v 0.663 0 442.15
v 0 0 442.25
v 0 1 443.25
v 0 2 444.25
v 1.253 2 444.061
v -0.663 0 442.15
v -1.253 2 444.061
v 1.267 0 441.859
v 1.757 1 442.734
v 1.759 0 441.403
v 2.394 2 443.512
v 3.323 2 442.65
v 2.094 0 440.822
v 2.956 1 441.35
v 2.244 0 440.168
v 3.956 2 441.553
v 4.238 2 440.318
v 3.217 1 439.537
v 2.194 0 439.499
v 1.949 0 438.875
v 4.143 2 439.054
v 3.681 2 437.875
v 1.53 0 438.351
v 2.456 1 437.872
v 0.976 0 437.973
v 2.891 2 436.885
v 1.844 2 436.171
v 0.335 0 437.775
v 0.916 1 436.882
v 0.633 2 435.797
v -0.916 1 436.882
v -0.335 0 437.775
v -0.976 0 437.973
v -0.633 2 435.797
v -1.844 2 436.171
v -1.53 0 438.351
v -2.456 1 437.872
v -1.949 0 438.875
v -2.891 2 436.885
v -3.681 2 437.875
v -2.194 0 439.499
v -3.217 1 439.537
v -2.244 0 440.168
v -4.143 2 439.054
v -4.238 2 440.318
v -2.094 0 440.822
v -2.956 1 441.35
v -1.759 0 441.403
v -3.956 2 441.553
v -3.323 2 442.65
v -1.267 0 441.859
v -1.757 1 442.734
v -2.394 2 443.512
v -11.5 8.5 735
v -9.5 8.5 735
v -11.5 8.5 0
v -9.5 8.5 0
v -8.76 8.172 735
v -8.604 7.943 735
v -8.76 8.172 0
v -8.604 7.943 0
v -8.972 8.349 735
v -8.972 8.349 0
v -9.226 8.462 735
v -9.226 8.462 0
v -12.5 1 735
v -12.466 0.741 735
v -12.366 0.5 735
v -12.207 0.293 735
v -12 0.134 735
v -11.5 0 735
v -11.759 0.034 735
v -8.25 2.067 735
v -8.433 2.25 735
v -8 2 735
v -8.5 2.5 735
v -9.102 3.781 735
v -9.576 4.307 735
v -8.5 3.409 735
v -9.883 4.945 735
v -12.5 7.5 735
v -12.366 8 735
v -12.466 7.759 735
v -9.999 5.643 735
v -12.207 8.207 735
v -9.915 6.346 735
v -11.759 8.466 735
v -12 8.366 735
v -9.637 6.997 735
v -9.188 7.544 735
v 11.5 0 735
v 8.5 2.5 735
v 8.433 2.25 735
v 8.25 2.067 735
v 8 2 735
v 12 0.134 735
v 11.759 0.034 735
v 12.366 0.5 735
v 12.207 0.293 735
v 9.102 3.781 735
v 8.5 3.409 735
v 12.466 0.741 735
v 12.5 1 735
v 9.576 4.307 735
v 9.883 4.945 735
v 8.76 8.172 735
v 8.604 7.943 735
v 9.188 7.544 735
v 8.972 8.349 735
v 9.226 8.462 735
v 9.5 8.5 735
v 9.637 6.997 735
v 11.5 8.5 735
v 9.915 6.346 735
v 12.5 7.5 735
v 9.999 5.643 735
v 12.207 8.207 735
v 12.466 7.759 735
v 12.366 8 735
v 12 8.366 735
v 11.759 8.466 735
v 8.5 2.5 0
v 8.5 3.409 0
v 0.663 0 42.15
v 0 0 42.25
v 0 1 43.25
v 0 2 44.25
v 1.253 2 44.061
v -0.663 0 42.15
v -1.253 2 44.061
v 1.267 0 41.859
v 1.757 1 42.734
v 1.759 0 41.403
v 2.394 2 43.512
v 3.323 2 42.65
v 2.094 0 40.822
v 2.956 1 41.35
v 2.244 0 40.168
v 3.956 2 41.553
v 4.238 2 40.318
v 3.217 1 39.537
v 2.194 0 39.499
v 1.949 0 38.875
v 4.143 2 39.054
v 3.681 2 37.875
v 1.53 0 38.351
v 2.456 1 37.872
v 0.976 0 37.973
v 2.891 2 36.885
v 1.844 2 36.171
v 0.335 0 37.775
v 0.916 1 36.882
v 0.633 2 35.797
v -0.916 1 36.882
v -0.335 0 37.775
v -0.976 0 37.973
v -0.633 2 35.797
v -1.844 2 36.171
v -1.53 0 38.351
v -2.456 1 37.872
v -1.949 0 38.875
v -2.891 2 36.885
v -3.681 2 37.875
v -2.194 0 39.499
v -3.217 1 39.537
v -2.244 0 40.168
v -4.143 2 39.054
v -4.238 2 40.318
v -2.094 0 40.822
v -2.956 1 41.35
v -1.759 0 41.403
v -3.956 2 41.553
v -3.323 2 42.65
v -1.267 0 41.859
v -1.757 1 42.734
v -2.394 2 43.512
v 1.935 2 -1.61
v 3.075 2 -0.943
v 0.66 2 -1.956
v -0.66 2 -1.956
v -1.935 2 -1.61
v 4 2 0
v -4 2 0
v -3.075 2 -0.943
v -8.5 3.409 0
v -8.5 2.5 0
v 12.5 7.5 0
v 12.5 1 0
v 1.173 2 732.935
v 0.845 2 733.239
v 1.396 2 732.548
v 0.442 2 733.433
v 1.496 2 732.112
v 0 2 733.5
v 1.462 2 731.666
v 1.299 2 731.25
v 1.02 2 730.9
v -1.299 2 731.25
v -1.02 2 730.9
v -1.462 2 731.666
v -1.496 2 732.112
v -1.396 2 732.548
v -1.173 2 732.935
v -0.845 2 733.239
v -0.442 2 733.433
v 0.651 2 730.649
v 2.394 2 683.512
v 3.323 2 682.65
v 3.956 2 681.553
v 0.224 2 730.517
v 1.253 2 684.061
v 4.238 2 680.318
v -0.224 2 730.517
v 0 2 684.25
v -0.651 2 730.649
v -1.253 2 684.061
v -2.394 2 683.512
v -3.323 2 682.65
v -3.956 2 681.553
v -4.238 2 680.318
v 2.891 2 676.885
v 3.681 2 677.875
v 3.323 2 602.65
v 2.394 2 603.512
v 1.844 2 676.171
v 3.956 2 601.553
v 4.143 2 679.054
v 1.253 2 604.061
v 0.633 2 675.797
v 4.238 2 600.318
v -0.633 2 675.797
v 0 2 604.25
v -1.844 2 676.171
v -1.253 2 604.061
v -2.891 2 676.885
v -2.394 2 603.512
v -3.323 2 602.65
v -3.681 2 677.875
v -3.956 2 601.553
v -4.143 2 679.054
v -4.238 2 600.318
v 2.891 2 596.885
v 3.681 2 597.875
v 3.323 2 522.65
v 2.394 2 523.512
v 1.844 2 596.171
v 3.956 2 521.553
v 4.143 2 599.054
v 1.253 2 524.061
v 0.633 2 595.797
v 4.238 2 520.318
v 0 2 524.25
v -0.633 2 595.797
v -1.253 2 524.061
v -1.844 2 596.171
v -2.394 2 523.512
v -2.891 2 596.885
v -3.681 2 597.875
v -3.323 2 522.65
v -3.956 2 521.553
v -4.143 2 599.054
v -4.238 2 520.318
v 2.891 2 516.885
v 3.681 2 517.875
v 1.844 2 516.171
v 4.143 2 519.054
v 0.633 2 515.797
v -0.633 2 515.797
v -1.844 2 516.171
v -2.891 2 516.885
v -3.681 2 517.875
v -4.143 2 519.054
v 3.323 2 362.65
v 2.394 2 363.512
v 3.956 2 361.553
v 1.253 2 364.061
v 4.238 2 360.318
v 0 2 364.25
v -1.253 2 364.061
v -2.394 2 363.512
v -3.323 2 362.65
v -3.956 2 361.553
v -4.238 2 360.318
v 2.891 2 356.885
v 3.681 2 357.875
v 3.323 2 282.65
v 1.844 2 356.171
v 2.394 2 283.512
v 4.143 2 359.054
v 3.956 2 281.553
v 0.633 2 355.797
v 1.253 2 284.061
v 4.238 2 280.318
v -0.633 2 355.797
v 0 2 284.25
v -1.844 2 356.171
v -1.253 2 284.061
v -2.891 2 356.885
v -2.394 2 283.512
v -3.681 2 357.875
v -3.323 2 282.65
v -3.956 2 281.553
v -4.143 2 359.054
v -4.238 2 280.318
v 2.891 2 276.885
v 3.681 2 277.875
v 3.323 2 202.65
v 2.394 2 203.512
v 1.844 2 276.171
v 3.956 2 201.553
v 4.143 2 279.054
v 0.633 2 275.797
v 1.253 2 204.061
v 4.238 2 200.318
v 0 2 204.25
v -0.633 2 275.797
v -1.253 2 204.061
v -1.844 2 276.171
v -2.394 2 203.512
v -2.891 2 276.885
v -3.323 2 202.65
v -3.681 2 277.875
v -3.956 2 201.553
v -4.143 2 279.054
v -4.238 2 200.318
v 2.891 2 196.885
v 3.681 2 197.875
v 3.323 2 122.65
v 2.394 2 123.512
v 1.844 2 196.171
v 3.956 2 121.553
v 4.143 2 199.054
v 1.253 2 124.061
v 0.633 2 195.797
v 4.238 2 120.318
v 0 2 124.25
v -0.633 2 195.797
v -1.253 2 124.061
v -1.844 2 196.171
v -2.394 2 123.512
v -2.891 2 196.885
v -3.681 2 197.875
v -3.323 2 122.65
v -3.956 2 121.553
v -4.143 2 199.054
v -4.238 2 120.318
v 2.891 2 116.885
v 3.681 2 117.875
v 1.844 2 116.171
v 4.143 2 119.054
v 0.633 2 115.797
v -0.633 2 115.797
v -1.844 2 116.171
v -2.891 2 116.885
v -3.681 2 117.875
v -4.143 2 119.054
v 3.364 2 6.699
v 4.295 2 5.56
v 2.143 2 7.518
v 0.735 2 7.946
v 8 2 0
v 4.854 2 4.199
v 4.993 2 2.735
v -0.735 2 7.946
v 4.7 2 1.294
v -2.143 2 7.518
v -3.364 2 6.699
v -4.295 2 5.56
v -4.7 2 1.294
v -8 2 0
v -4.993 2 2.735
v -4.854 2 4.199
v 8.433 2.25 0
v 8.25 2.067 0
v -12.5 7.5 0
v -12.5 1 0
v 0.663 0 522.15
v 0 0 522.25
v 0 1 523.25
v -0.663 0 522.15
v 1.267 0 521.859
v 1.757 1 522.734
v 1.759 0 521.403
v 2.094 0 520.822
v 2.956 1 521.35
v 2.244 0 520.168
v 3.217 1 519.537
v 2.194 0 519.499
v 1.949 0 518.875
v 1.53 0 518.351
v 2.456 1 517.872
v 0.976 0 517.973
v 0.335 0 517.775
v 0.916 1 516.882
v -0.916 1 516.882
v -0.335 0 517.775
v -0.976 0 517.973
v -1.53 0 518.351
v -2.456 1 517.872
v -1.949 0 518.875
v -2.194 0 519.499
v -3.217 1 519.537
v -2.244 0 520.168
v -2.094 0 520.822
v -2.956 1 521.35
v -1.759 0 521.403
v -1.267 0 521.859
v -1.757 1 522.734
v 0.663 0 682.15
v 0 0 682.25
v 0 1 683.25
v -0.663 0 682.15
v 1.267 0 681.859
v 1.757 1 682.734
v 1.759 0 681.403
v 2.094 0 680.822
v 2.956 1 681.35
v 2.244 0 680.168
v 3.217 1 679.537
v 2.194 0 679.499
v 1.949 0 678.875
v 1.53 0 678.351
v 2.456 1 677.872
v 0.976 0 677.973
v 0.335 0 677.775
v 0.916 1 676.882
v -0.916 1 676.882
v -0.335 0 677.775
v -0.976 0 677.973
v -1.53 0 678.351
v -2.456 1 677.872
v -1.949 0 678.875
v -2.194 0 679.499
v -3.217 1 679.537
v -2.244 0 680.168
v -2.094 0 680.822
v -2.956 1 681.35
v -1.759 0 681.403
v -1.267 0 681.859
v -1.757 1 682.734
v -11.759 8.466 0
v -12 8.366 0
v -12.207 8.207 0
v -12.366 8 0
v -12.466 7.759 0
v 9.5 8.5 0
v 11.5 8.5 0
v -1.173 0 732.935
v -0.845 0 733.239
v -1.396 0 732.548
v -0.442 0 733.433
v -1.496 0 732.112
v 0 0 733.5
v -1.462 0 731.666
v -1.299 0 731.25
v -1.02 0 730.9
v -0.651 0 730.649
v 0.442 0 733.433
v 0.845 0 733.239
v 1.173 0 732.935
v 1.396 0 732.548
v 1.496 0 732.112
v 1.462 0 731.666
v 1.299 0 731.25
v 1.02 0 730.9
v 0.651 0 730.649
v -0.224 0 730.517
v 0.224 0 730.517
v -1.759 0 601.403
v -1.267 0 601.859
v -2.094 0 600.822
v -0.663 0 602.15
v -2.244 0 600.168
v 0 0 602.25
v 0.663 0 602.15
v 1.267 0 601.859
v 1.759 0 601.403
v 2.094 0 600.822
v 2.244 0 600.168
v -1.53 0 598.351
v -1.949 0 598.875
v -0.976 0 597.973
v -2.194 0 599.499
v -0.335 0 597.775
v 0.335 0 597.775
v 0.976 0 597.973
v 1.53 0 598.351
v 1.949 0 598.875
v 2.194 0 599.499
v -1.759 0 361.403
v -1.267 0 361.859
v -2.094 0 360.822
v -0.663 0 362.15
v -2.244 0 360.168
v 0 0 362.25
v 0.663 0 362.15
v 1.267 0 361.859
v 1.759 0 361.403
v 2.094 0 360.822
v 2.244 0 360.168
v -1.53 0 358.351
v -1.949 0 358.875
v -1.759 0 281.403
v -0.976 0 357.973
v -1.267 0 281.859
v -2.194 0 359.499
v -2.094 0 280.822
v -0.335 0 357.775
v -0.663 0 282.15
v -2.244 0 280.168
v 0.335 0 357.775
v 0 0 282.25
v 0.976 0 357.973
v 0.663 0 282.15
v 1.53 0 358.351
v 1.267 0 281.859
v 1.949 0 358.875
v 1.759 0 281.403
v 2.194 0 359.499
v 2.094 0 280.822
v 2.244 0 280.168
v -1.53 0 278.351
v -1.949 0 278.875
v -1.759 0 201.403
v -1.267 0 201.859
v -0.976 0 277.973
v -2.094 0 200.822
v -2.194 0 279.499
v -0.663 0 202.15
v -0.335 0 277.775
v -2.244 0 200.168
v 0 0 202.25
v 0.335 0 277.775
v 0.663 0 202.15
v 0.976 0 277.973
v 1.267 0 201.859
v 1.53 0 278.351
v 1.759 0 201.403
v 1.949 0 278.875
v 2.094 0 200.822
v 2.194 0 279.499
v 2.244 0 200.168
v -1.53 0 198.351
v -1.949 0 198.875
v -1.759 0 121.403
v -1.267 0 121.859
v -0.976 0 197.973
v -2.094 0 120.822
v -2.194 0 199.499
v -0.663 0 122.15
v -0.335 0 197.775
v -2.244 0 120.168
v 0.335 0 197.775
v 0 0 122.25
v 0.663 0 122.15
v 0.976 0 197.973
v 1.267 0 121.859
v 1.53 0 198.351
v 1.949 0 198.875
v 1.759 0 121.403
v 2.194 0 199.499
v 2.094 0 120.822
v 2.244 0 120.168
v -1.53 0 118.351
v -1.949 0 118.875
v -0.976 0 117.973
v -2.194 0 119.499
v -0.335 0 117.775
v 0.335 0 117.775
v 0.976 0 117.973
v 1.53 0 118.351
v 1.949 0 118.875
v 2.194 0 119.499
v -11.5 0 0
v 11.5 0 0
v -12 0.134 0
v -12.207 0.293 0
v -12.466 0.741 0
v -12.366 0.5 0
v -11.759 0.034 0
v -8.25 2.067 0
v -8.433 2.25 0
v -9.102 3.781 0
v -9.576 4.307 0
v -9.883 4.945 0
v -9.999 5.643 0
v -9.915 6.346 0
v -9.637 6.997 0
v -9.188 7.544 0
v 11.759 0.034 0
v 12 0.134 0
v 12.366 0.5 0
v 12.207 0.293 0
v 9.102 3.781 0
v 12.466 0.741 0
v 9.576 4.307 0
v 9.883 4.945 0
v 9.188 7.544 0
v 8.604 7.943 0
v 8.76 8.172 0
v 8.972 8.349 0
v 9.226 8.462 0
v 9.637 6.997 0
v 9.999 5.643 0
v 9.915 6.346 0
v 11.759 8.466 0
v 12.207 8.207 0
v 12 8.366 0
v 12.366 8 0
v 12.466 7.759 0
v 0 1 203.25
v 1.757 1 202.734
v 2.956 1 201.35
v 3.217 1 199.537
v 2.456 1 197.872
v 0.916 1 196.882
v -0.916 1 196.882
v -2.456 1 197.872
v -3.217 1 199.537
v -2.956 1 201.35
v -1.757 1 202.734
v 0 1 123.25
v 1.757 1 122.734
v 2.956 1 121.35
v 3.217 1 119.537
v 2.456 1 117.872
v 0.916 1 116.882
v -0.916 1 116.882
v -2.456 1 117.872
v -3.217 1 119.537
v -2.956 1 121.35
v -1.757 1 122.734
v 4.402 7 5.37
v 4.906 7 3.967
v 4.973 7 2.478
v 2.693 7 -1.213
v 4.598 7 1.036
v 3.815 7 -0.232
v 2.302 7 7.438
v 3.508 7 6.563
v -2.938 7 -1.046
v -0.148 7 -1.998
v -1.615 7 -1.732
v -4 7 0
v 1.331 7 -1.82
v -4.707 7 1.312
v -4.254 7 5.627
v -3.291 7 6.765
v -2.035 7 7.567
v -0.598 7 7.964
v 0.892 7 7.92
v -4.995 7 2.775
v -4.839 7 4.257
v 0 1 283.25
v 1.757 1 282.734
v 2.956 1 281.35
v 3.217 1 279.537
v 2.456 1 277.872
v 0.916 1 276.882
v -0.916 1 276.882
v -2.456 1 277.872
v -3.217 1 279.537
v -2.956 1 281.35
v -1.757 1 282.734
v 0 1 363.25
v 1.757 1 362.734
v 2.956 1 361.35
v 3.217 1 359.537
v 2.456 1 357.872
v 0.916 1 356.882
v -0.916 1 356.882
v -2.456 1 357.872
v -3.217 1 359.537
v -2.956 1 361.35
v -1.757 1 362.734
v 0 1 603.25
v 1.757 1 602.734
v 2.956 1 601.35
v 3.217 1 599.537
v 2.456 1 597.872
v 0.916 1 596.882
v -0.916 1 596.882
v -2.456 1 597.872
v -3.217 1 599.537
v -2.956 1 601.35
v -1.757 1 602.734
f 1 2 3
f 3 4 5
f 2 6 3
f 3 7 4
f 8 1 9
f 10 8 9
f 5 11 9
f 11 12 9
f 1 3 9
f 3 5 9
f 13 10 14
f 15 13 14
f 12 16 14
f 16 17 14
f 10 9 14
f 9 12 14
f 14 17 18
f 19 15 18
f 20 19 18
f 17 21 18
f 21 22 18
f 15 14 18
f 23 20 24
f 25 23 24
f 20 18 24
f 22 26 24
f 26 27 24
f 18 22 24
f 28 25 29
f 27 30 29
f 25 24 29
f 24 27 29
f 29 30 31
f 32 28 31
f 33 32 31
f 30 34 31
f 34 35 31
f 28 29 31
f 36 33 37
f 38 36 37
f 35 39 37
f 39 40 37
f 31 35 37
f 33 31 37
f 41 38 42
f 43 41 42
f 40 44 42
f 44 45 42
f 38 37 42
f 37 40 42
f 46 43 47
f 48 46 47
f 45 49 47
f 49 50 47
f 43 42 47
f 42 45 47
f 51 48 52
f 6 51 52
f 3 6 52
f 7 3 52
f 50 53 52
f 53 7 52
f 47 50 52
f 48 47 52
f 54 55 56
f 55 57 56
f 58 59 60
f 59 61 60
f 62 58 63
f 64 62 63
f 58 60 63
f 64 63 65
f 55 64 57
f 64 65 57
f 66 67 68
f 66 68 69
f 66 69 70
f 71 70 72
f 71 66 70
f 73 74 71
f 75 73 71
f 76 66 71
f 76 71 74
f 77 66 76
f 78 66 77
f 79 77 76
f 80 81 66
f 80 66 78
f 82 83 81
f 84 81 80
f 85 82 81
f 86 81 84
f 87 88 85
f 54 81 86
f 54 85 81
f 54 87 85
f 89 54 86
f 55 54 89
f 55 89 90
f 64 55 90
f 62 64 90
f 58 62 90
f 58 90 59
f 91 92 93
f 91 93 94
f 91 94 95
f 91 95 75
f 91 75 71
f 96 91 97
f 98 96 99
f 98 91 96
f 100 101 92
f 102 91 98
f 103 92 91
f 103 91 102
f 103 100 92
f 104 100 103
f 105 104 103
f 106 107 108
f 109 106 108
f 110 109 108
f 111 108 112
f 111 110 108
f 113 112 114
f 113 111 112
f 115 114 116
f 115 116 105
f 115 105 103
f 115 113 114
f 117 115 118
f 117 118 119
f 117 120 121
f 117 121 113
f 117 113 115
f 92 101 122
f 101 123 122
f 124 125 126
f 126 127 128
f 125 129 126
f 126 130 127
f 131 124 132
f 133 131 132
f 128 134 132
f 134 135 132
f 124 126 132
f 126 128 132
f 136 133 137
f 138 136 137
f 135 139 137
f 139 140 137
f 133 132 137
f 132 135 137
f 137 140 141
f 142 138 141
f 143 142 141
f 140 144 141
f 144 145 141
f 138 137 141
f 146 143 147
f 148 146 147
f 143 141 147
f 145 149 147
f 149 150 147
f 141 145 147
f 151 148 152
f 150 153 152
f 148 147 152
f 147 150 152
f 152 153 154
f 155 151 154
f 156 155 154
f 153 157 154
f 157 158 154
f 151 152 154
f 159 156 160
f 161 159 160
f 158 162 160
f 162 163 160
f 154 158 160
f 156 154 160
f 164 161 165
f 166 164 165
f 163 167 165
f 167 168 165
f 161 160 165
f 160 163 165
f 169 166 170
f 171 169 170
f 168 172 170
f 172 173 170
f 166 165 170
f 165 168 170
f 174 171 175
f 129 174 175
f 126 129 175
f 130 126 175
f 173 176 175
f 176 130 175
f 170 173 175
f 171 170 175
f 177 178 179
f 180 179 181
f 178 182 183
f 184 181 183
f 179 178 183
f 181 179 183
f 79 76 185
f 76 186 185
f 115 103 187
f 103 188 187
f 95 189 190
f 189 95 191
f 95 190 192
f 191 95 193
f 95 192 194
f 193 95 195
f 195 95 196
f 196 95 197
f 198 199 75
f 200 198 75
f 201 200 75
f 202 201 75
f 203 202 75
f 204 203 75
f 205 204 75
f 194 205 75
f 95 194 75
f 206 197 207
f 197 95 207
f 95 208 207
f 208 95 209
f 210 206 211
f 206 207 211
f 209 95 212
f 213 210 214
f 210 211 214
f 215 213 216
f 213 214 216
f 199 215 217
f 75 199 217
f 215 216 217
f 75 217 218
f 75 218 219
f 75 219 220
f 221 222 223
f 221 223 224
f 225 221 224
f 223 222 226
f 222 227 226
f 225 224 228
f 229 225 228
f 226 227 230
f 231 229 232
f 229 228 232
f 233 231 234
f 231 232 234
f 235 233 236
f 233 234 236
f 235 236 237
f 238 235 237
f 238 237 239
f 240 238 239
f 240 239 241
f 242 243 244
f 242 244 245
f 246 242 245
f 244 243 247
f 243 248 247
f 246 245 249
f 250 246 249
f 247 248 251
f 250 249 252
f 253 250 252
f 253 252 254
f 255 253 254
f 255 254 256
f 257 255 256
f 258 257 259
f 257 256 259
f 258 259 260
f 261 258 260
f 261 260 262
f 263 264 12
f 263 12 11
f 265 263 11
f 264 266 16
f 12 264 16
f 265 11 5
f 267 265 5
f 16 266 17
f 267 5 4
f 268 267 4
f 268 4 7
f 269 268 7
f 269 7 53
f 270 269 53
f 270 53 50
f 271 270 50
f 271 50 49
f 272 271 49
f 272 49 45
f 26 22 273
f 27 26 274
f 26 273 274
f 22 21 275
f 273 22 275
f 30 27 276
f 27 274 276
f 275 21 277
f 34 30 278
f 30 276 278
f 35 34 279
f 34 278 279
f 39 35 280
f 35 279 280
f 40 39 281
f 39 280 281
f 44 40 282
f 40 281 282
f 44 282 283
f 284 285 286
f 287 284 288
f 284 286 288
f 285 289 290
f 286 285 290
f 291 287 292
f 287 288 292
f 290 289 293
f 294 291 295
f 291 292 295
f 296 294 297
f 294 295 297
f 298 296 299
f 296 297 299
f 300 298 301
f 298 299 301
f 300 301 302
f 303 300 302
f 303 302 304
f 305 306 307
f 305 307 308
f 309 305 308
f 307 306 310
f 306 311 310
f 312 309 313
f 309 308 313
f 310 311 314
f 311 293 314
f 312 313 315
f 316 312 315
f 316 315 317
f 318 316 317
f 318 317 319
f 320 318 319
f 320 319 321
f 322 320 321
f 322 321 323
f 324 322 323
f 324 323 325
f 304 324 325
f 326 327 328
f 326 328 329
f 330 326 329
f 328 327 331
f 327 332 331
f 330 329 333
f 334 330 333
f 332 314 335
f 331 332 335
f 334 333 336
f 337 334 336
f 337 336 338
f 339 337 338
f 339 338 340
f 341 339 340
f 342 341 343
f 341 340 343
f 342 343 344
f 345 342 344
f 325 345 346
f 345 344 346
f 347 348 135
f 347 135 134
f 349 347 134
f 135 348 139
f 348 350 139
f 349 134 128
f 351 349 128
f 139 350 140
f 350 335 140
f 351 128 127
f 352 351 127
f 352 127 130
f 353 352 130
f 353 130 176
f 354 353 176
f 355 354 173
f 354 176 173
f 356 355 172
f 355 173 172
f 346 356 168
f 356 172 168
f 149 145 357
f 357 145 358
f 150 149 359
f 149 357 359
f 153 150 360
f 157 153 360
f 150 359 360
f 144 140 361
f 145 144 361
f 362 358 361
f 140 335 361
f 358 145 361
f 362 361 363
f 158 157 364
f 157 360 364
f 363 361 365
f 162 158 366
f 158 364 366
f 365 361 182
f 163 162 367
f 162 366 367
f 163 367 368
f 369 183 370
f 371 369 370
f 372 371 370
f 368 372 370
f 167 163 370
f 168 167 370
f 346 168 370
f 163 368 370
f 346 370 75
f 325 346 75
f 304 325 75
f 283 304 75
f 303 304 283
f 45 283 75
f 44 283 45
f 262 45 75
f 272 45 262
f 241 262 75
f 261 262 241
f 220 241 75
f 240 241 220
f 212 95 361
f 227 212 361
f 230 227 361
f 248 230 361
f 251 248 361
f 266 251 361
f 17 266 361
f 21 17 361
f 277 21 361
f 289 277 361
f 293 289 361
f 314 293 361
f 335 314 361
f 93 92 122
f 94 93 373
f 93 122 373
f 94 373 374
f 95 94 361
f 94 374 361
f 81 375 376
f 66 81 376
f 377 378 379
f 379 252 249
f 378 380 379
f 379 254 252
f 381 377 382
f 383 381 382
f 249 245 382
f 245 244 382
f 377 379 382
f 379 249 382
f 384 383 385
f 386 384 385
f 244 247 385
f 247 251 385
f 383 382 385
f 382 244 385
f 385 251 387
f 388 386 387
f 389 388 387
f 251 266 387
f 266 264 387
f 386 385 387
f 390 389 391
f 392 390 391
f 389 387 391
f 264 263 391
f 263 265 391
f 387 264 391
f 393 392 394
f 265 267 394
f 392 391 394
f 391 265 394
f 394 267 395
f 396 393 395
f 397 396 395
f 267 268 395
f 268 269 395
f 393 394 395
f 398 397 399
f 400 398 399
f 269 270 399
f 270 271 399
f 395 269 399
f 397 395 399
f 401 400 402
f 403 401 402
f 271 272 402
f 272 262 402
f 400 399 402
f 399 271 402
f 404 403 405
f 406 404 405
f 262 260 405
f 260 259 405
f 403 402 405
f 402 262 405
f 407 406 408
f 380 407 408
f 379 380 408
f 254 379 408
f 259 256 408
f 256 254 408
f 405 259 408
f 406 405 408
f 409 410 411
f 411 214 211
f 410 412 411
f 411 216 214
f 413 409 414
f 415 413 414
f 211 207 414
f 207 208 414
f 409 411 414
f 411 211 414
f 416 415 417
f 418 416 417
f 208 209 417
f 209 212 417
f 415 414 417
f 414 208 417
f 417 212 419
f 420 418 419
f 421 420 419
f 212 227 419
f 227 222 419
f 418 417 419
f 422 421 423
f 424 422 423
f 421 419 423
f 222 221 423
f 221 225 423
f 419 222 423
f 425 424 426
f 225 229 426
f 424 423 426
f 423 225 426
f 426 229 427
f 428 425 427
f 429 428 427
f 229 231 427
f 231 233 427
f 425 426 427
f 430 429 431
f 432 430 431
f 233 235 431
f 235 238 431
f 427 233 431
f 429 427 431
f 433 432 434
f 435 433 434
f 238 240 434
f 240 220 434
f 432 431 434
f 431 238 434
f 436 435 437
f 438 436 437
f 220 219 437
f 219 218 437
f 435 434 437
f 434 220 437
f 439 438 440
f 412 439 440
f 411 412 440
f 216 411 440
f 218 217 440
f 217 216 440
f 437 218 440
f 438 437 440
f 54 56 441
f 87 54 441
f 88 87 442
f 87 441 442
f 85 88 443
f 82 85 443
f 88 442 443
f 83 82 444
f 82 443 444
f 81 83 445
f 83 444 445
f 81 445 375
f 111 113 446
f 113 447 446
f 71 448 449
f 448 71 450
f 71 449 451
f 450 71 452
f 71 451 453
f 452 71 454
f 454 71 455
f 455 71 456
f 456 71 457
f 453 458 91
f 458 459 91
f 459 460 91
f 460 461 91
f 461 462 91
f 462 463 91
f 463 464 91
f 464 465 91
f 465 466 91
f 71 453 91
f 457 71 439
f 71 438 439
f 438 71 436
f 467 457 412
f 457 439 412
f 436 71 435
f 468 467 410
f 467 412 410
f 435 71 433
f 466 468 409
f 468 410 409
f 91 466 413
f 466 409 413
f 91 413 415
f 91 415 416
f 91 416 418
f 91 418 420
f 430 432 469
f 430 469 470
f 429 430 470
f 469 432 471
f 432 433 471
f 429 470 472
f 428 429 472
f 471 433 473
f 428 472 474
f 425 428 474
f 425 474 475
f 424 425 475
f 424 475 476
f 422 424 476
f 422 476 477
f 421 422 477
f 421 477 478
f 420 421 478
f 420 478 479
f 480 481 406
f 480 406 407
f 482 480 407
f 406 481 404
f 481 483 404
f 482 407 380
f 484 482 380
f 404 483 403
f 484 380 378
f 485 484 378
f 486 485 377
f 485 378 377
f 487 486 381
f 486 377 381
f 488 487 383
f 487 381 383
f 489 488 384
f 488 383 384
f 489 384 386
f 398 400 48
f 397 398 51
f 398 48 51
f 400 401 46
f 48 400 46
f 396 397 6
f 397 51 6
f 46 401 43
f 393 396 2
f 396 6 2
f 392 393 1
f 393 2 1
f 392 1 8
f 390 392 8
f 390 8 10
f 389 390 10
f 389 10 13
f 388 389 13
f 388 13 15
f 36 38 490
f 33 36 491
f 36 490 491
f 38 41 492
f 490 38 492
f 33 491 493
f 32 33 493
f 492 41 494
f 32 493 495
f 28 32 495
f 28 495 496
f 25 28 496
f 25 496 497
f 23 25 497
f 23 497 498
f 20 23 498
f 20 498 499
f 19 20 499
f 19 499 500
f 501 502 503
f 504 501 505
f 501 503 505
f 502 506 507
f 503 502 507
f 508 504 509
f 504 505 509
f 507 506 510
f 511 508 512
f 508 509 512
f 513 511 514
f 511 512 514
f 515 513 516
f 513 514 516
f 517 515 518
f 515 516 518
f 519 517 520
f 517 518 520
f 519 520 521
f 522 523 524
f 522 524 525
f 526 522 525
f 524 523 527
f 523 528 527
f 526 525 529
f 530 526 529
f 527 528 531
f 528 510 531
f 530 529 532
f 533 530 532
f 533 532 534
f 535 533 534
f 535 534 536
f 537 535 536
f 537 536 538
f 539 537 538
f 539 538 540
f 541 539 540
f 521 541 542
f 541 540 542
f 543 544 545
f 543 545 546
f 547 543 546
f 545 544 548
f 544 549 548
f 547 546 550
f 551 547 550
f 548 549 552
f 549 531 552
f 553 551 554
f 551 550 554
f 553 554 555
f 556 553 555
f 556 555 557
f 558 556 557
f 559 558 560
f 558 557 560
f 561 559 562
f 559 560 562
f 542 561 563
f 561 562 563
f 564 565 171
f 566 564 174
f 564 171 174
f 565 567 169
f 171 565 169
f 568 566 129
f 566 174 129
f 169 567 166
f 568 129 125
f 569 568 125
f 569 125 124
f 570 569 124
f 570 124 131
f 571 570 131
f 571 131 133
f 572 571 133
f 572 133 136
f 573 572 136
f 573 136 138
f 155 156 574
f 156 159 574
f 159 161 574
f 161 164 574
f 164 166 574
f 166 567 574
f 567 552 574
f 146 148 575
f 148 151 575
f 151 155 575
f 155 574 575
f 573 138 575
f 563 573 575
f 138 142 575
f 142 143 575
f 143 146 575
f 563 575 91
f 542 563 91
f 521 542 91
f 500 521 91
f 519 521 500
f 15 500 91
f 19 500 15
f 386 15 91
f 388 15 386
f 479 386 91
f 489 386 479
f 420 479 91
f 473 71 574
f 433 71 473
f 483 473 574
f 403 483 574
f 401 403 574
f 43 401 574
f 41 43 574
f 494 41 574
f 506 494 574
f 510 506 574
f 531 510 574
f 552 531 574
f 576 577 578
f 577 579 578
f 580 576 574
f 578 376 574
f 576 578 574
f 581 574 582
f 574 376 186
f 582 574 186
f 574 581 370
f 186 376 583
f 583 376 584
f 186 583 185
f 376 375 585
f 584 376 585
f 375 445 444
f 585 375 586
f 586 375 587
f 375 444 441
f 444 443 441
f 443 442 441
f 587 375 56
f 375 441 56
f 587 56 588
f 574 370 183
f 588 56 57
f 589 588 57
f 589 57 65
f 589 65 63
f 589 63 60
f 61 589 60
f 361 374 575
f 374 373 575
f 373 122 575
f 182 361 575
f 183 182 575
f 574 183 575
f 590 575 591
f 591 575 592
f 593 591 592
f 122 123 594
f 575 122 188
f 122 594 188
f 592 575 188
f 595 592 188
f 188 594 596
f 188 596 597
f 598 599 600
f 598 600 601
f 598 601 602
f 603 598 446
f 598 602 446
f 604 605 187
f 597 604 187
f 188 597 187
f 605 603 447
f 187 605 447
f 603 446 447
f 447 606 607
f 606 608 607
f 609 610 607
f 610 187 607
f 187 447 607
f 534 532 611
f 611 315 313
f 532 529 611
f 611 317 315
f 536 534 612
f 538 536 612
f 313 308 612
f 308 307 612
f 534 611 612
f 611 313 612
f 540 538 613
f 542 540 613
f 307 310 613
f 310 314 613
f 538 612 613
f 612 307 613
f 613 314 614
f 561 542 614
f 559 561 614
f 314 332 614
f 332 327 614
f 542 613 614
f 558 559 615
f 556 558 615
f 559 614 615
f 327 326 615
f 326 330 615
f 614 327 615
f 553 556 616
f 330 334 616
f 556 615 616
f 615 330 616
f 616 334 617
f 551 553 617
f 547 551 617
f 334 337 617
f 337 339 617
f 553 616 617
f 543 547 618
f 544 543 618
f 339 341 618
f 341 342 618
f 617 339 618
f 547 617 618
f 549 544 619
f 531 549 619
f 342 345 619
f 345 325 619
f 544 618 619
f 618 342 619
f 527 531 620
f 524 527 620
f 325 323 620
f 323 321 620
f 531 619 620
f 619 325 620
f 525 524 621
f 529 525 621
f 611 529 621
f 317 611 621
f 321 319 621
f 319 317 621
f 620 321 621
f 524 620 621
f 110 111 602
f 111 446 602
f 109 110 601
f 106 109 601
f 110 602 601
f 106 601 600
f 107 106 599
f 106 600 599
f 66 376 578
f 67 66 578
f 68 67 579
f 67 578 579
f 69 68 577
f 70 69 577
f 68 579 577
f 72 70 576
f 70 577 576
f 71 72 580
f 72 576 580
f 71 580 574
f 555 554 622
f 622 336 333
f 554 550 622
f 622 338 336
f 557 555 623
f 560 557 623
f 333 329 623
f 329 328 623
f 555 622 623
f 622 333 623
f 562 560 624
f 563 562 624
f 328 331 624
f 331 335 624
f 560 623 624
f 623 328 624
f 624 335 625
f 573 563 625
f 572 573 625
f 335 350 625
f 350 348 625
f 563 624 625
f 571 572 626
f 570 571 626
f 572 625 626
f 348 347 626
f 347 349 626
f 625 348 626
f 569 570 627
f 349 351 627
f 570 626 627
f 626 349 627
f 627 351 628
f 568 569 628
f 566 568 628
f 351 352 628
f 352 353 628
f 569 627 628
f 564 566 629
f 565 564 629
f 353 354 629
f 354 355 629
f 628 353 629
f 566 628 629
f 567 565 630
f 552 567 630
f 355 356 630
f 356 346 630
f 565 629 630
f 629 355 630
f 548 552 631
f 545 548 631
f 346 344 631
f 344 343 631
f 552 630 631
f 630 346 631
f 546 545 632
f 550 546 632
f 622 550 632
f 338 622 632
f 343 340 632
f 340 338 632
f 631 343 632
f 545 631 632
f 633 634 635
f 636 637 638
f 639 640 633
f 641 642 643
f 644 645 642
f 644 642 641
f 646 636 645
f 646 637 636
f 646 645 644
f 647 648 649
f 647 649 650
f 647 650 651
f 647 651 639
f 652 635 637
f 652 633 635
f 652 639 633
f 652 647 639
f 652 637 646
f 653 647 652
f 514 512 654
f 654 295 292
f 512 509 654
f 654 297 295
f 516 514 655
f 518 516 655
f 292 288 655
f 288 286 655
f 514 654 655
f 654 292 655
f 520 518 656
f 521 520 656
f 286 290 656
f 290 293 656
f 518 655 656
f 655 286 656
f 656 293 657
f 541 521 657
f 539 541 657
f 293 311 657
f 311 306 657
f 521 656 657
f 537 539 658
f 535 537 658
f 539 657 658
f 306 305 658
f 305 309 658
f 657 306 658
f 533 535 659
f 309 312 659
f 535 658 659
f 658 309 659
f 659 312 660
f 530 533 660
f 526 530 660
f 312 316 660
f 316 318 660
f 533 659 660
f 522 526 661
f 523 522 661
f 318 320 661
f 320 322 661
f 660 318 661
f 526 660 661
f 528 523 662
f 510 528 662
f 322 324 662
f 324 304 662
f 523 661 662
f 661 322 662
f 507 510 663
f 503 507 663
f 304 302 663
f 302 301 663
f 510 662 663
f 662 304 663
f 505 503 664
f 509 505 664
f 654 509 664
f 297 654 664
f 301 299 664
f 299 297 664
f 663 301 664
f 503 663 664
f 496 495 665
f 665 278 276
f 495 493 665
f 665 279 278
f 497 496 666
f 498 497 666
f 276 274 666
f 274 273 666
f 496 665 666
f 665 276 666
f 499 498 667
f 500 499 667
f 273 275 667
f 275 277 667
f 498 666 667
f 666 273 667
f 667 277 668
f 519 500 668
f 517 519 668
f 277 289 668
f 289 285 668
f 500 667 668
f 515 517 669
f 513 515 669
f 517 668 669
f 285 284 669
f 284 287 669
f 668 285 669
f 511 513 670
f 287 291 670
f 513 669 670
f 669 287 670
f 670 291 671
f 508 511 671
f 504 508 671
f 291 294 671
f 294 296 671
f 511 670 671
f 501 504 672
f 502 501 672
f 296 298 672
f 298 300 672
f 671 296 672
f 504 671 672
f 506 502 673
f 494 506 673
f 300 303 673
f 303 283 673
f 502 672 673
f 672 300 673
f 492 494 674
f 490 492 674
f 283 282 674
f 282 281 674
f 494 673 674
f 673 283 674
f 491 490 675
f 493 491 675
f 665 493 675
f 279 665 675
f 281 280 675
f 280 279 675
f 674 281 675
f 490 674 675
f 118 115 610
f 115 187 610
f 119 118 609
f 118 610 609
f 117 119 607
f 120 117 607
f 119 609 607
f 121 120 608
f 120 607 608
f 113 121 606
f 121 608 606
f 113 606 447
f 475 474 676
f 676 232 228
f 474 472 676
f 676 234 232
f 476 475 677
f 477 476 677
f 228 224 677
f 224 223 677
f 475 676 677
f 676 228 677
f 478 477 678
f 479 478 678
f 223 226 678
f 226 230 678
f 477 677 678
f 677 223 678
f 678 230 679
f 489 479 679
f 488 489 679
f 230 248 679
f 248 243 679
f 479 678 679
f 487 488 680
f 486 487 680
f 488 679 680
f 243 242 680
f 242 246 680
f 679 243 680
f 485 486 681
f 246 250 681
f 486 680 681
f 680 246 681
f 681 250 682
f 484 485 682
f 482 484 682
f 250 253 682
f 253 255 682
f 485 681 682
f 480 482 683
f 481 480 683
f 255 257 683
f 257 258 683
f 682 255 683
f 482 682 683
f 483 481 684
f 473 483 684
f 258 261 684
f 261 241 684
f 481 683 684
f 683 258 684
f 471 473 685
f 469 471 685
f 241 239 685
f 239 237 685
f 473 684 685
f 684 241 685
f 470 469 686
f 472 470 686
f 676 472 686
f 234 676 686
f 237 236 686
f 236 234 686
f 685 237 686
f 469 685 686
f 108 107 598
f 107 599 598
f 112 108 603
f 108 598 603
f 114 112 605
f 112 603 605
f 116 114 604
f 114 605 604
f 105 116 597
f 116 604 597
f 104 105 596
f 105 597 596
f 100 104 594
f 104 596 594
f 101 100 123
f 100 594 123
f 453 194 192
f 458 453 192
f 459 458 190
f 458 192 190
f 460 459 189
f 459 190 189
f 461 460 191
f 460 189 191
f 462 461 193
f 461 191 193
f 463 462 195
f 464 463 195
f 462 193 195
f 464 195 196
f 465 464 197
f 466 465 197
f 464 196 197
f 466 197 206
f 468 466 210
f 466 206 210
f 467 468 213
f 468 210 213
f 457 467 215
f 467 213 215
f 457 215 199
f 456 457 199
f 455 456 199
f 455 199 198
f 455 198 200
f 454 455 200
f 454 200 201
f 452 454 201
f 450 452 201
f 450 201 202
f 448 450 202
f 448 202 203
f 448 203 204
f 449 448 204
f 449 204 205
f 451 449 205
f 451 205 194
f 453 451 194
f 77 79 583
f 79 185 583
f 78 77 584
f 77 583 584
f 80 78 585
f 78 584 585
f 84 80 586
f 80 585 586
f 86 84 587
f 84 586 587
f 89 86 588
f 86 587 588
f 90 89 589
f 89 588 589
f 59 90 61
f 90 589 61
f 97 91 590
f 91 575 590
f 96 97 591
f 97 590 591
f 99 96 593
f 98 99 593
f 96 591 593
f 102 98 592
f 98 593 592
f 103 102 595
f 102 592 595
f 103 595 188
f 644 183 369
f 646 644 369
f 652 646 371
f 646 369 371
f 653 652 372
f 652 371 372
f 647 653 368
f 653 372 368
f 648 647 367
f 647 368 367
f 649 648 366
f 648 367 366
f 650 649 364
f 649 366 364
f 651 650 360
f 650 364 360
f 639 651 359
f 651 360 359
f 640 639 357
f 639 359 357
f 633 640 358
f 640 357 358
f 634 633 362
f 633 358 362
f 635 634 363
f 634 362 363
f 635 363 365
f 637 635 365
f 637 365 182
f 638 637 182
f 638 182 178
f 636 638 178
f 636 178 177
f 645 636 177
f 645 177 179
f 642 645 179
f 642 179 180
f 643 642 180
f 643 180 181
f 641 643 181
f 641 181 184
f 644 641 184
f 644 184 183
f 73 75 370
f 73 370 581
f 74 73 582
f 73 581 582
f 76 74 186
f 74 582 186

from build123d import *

# Parameters (mm, degrees)
EXTRUDE_1_DEPTH          = 720
SKETCH_3_R               = 5
EXTRUDE_3_DEPTH          = 5
HOLE_WIZARD_1_AT_2_COUNT = 2
HOLE_WIZARD_1_AT_2_PITCH = 640
HOLE_WIZARD_1_AT_3_COUNT = 2
HOLE_WIZARD_1_AT_3_PITCH = 560
HOLE_WIZARD_1_AT_4_COUNT = 2
HOLE_WIZARD_1_AT_4_PITCH = 480
HOLE_WIZARD_1_AT_5_COUNT = 2
HOLE_WIZARD_1_AT_5_PITCH = 400
HOLE_WIZARD_1_AT_6_COUNT = 2
HOLE_WIZARD_1_AT_6_PITCH = 320
HOLE_WIZARD_1_AT_7_COUNT = 2
HOLE_WIZARD_1_AT_7_PITCH = 240
HOLE_WIZARD_1_AT_8_COUNT = 2
HOLE_WIZARD_1_AT_8_PITCH = 160
HOLE_WIZARD_1_AT_9_COUNT = 2
HOLE_WIZARD_1_AT_9_PITCH = 80
FILLET_1_R               = 0.5
FILLET_2_R               = 1
EXTRUDE_4_DEPTH          = 15
SKETCH_7_R               = 1.5
CUT_EXTRUDE_1_DEPTH      = 736.135021612


with BuildPart() as part:
    # ｽｹｯﾁ1 → ﾎﾞｽ - 押し出し1 (new body)
    with BuildSketch(Plane.XY.offset(720)):
        with BuildLine():
            Line((8.5, 3.408712153), (8.5, 2))
            Line((8.5, 2), (-8.5, 2))
            Line((-8.5, 2), (-8.5, 3.408712153))
            ThreePointArc((-8.5, 3.408712153), (-9.999347871, 5.642901666), (-8.603592403, 7.943230663))
            ThreePointArc((-8.603592403, 7.943230663), (-8.97237829, 8.349479447), (-9.5, 8.5))
            Line((-9.5, 8.5), (-12.5, 8.5))
            Line((-12.5, 8.5), (-12.5, 0))
            Line((-12.5, 0), (12.5, 0))
            Line((12.5, 0), (12.5, 8.5))
            Line((12.5, 8.5), (9.5, 8.5))
            ThreePointArc((9.5, 8.5), (8.97237829, 8.349479447), (8.603592403, 7.943230663))
            ThreePointArc((8.603592403, 7.943230663), (9.999347871, 5.642901666), (8.5, 3.408712153))
        make_face()
    extrude(amount=-EXTRUDE_1_DEPTH)

    # ｽｹｯﾁ3 → ﾎﾞｽ - 押し出し3 (add)
    with BuildSketch(Plane(origin=(0, 2, 0), x_dir=(-1, 0, 0), z_dir=(0, 1, 0))):
        with Locations(Location((0, 3, 0), (0, 0, 323.130102354))):
            Circle(SKETCH_3_R)
    extrude(amount=EXTRUDE_3_DEPTH)

    # ｽｹｯﾁ4 → 穴1 (revolve, cut)
    with BuildSketch(Plane(origin=(0, 2, 40), x_dir=(0, 0, 1), z_dir=(1, 0, 0))):
        Polygon((0, 0), (0, 2), (2.25, 2), (4.25, 0), align=None)
    hole_wizard_1 = revolve(axis=Axis((0, -108, 40), (0, 1, 0)), mode=Mode.SUBTRACT)

    # 穴1 at 2: 穴1 ×2
    with Locations(*[(0, 0, i * HOLE_WIZARD_1_AT_2_PITCH) for i in range(1, HOLE_WIZARD_1_AT_2_COUNT)]):
        add(hole_wizard_1, mode=Mode.SUBTRACT)

    # 穴1 at 3: 穴1 ×2
    with Locations(*[(0, 0, i * HOLE_WIZARD_1_AT_3_PITCH) for i in range(1, HOLE_WIZARD_1_AT_3_COUNT)]):
        add(hole_wizard_1, mode=Mode.SUBTRACT)

    # 穴1 at 4: 穴1 ×2
    with Locations(*[(0, 0, i * HOLE_WIZARD_1_AT_4_PITCH) for i in range(1, HOLE_WIZARD_1_AT_4_COUNT)]):
        add(hole_wizard_1, mode=Mode.SUBTRACT)

    # 穴1 at 5: 穴1 ×2
    with Locations(*[(0, 0, i * HOLE_WIZARD_1_AT_5_PITCH) for i in range(1, HOLE_WIZARD_1_AT_5_COUNT)]):
        add(hole_wizard_1, mode=Mode.SUBTRACT)

    # 穴1 at 6: 穴1 ×2
    with Locations(*[(0, 0, i * HOLE_WIZARD_1_AT_6_PITCH) for i in range(1, HOLE_WIZARD_1_AT_6_COUNT)]):
        add(hole_wizard_1, mode=Mode.SUBTRACT)

    # 穴1 at 7: 穴1 ×2
    with Locations(*[(0, 0, i * HOLE_WIZARD_1_AT_7_PITCH) for i in range(1, HOLE_WIZARD_1_AT_7_COUNT)]):
        add(hole_wizard_1, mode=Mode.SUBTRACT)

    # 穴1 at 8: 穴1 ×2
    with Locations(*[(0, 0, i * HOLE_WIZARD_1_AT_8_PITCH) for i in range(1, HOLE_WIZARD_1_AT_8_COUNT)]):
        add(hole_wizard_1, mode=Mode.SUBTRACT)

    # 穴1 at 9: 穴1 ×2
    with Locations(*[(0, 0, i * HOLE_WIZARD_1_AT_9_PITCH) for i in range(1, HOLE_WIZARD_1_AT_9_COUNT)]):
        add(hole_wizard_1, mode=Mode.SUBTRACT)

    # ﾌｨﾚｯﾄ1
    fillet_1_edges = [part.edges().sort_by_distance(p)[0] for p in [
        (-8.5, 2, 360),
        (8.5, 2, 360),
    ]]
    fillet(fillet_1_edges, radius=FILLET_1_R)

    # ﾌｨﾚｯﾄ2
    fillet_2_edges = [part.edges().sort_by_distance(p)[0] for p in [
        (12.5, 8.5, 360),
        (12.5, 0, 360),
        (-12.5, 0, 360),
        (-12.5, 8.5, 360),
    ]]
    fillet(fillet_2_edges, radius=FILLET_2_R)

    # ｽｹｯﾁ6 → ﾎﾞｽ - 押し出し4 (add)
    with BuildSketch(Plane.XY.offset(720)):
        with BuildLine():
            ThreePointArc((-12.5, 1), (-12.207106781, 0.292893219), (-11.5, 0))
            Line((-11.5, 0), (11.5, 0))
            ThreePointArc((11.5, 0), (12.207106781, 0.292893219), (12.5, 1))
            Line((12.5, 1), (12.5, 7.5))
            ThreePointArc((12.5, 7.5), (12.207106781, 8.207106781), (11.5, 8.5))
            Line((11.5, 8.5), (9.5, 8.5))
            ThreePointArc((9.5, 8.5), (8.97237829, 8.349479447), (8.603592403, 7.943230663))
            ThreePointArc((8.603592403, 7.943230663), (9.999347871, 5.642901666), (8.5, 3.408712153))
            Line((8.5, 3.408712153), (8.5, 2.5))
            ThreePointArc((8.5, 2.5), (8.353553391, 2.146446609), (8, 2))
            Line((8, 2), (-8, 2))
            ThreePointArc((-8, 2), (-8.353553391, 2.146446609), (-8.5, 2.5))
            Line((-8.5, 2.5), (-8.5, 3.408712153))
            ThreePointArc((-8.5, 3.408712153), (-9.999347871, 5.642901666), (-8.603592403, 7.943230663))
            ThreePointArc((-8.603592403, 7.943230663), (-8.97237829, 8.349479447), (-9.5, 8.5))
            Line((-9.5, 8.5), (-11.5, 8.5))
            ThreePointArc((-11.5, 8.5), (-12.207106781, 8.207106781), (-12.5, 7.5))
            Line((-12.5, 7.5), (-12.5, 1))
        make_face()
    extrude(amount=EXTRUDE_4_DEPTH)

    # ｽｹｯﾁ7 → ｶｯﾄ - 押し出し1 (cut, through all)
    with BuildSketch(Plane(origin=(0, 2, 0), x_dir=(1, 0, 0), z_dir=(0, 1, 0))):
        with Locations(Location((0, -732, 0), (0, 0, 270))):
            Circle(SKETCH_7_R)
    extrude(amount=-CUT_EXTRUDE_1_DEPTH, mode=Mode.SUBTRACT)


solid = part.part
